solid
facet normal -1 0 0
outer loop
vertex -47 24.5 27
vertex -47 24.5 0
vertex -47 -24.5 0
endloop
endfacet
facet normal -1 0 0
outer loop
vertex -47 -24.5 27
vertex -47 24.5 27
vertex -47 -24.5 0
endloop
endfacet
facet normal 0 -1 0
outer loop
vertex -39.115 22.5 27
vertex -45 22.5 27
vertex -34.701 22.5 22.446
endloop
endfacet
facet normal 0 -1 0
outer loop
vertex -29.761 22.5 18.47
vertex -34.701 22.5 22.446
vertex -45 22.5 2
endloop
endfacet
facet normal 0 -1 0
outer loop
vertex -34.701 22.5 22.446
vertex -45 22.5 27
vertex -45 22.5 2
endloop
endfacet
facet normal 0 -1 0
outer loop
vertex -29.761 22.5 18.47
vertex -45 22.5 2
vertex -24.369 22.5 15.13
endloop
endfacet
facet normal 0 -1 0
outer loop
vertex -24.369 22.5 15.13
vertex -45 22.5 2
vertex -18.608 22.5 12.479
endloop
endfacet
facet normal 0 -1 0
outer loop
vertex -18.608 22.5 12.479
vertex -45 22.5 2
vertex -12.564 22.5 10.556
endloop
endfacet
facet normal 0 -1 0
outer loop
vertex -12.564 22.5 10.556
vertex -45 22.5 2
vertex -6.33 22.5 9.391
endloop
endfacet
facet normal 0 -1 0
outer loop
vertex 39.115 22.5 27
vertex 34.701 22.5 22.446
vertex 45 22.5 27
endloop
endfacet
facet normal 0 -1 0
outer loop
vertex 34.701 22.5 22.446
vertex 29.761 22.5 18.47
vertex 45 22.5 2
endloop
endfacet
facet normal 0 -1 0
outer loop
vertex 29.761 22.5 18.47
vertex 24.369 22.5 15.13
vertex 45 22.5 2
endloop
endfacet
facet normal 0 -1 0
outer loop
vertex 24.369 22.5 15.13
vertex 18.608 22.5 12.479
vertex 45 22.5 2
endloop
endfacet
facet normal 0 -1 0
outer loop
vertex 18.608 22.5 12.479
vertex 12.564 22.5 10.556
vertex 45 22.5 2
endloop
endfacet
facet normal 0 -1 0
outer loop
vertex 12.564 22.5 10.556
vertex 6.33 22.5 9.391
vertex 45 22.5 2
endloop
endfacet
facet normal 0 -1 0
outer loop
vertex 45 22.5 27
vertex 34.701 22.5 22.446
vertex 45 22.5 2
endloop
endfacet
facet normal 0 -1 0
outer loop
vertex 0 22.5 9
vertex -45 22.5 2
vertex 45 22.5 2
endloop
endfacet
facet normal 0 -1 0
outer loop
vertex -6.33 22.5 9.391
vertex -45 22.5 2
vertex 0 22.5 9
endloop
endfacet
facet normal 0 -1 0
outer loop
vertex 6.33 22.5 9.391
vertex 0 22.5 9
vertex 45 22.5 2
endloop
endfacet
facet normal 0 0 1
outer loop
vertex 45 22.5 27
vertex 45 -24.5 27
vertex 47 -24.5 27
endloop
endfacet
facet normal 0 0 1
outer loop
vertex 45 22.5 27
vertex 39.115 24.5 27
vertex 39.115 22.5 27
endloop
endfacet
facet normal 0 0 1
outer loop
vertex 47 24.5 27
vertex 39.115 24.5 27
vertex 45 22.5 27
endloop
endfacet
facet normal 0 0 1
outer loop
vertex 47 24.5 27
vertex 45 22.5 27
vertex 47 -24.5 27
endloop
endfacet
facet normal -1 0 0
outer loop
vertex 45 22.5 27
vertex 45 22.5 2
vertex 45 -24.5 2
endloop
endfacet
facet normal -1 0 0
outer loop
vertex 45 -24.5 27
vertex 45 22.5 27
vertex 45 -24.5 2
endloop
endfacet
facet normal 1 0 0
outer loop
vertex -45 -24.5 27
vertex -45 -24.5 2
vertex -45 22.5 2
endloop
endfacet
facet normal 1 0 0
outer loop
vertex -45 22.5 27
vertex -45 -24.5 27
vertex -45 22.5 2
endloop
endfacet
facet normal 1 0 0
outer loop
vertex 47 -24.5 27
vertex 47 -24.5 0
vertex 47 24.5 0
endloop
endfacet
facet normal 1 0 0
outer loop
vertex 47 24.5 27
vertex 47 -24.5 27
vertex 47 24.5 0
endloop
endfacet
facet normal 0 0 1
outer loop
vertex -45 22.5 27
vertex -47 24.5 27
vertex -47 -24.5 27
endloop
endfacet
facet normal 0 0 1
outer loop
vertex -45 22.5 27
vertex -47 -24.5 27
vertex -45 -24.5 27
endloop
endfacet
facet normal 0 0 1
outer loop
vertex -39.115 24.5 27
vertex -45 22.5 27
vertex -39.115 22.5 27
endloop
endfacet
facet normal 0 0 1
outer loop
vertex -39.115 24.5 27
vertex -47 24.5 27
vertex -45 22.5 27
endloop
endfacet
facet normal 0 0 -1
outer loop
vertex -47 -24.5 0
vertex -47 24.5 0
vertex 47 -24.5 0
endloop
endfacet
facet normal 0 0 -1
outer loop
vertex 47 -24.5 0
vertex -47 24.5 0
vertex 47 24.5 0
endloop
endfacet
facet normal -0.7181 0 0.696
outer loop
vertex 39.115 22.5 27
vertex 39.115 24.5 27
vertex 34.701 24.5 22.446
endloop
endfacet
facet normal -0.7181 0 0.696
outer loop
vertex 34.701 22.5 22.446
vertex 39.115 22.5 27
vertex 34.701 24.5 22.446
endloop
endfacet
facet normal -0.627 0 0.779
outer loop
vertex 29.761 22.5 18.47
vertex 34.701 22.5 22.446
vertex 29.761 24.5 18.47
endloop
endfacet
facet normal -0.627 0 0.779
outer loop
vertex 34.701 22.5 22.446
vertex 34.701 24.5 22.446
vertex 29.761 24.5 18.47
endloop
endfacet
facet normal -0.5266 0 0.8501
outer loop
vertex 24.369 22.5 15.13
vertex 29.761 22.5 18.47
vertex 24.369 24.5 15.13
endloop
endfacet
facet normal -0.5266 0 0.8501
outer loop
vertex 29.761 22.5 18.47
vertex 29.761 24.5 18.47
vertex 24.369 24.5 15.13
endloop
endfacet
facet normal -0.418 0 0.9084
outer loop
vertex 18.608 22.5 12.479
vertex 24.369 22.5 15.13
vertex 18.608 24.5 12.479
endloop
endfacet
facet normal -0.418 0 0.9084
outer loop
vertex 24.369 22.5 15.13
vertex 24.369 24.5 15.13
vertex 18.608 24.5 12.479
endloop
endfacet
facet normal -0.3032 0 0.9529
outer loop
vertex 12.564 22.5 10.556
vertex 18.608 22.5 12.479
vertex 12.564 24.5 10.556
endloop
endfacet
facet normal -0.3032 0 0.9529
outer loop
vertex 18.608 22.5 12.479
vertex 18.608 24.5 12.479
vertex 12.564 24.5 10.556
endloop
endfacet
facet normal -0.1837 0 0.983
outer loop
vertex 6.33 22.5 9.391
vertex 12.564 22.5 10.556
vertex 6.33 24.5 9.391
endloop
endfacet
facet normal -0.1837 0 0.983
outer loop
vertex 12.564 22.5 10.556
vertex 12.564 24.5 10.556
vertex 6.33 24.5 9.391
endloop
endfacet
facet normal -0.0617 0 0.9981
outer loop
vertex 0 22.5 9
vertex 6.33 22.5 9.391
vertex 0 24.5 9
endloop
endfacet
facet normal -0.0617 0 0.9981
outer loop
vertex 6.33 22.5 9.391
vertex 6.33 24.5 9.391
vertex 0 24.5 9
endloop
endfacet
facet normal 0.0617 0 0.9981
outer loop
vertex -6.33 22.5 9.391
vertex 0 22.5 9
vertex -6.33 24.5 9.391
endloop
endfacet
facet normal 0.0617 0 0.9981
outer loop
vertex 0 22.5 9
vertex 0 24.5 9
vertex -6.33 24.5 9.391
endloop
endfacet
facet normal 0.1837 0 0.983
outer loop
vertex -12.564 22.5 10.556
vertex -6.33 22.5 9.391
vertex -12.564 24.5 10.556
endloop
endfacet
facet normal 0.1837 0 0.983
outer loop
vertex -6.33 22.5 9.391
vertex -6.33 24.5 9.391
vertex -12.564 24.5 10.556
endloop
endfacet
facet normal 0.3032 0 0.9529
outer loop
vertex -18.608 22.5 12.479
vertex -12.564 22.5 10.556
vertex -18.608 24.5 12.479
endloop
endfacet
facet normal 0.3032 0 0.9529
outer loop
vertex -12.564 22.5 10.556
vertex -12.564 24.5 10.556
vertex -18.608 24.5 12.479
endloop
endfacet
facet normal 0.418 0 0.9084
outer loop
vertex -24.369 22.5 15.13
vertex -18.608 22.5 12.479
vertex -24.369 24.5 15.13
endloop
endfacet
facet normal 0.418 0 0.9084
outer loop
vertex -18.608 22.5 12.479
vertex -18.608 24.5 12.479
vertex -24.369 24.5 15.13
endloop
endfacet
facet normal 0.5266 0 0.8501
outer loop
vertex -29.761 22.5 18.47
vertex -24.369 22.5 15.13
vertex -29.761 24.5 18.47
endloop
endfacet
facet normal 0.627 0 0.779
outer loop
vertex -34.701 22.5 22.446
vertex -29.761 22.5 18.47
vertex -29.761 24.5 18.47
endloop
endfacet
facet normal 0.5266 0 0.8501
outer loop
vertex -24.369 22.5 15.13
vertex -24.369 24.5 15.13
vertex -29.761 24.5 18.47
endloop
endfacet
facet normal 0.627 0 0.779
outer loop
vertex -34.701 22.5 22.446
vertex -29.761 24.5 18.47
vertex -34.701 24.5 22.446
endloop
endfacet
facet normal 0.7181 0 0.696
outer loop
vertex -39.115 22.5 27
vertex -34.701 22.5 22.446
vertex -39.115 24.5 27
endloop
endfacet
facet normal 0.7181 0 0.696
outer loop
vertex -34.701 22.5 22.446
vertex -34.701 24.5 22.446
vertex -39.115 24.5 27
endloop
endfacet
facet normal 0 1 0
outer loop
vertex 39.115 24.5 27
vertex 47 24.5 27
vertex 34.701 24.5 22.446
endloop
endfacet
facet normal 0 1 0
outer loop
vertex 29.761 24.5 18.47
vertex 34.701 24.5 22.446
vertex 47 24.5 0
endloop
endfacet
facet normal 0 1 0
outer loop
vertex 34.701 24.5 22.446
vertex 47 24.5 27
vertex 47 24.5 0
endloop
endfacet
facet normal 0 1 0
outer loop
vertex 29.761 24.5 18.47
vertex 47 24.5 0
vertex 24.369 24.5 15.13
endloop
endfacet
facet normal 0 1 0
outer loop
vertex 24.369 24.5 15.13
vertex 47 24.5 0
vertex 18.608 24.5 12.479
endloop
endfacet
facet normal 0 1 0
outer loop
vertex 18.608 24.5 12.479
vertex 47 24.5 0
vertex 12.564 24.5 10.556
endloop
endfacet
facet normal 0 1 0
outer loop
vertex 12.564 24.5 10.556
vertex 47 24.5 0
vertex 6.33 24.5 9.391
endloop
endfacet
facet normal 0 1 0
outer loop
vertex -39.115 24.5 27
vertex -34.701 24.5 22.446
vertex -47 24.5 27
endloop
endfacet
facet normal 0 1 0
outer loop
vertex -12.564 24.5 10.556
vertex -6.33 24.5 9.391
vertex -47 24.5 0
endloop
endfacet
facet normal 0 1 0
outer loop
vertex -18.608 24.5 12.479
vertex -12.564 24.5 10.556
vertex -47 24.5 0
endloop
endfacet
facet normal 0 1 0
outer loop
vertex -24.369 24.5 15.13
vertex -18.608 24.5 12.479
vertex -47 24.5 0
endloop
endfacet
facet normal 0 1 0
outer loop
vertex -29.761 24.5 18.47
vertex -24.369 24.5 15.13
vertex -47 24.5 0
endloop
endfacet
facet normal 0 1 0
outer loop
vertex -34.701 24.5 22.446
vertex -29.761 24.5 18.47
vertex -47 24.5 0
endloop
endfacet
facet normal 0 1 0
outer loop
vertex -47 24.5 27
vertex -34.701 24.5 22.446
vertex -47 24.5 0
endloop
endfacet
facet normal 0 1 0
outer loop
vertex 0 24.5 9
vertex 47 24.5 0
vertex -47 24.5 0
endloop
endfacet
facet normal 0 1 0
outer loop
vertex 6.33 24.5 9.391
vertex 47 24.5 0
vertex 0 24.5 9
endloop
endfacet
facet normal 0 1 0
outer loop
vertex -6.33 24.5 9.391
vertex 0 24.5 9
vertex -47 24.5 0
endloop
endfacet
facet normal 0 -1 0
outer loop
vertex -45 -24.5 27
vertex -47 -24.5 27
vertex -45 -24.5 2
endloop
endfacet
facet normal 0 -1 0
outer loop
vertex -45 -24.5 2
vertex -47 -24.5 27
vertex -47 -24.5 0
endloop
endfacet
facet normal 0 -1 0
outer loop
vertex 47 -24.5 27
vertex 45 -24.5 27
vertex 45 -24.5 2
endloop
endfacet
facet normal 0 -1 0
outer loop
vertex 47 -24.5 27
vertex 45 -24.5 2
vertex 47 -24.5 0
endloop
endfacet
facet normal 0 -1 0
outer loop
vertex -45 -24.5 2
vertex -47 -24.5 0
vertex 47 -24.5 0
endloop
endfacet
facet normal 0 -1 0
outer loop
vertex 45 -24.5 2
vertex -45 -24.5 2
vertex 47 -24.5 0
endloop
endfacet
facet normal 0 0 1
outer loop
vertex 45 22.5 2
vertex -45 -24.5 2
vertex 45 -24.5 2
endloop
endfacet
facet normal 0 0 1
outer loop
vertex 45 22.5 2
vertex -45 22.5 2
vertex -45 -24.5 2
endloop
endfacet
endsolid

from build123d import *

# Parameters (mm, degrees)
F1_DEPTH = 2
F2_DEPTH = 27
F4_DEPTH = 25


with BuildPart() as f1:
    # F0 (on Top) → F1 (new body)
    with BuildSketch(Plane.XY):
        Polygon((-45, -24.5), (45, -24.5), (45, -22.5), (45, 22.5), (-45, 22.5), (-45, -22.5), align=None)
    extrude(amount=F1_DEPTH)

    # F0 (on Top) → F2 (join)
    with BuildSketch(Plane.XY):
        Polygon((47, -24.5), (47, 24.5), (-47, 24.5), (-47, -24.5), (-45, -24.5), (-45, -22.5), (-45, 22.5), (45, 22.5), (45, -22.5), (45, -24.5), align=None)
    extrude(amount=F2_DEPTH)

    # F3 (on face) → F4 (cut)
    with BuildSketch(Plane(origin=(0, 24.5, 0), x_dir=(-1, 0, 0), z_dir=(0, 1, 0))):
        with BuildLine():
            Line((39.115214, 27), (-39.115214, 27))
            ThreePointArc((-39.115214, 27), (0, 9), (39.115214, 27))
        make_face()
    extrude(amount=-F4_DEPTH, mode=Mode.SUBTRACT)


solid = f1.part
